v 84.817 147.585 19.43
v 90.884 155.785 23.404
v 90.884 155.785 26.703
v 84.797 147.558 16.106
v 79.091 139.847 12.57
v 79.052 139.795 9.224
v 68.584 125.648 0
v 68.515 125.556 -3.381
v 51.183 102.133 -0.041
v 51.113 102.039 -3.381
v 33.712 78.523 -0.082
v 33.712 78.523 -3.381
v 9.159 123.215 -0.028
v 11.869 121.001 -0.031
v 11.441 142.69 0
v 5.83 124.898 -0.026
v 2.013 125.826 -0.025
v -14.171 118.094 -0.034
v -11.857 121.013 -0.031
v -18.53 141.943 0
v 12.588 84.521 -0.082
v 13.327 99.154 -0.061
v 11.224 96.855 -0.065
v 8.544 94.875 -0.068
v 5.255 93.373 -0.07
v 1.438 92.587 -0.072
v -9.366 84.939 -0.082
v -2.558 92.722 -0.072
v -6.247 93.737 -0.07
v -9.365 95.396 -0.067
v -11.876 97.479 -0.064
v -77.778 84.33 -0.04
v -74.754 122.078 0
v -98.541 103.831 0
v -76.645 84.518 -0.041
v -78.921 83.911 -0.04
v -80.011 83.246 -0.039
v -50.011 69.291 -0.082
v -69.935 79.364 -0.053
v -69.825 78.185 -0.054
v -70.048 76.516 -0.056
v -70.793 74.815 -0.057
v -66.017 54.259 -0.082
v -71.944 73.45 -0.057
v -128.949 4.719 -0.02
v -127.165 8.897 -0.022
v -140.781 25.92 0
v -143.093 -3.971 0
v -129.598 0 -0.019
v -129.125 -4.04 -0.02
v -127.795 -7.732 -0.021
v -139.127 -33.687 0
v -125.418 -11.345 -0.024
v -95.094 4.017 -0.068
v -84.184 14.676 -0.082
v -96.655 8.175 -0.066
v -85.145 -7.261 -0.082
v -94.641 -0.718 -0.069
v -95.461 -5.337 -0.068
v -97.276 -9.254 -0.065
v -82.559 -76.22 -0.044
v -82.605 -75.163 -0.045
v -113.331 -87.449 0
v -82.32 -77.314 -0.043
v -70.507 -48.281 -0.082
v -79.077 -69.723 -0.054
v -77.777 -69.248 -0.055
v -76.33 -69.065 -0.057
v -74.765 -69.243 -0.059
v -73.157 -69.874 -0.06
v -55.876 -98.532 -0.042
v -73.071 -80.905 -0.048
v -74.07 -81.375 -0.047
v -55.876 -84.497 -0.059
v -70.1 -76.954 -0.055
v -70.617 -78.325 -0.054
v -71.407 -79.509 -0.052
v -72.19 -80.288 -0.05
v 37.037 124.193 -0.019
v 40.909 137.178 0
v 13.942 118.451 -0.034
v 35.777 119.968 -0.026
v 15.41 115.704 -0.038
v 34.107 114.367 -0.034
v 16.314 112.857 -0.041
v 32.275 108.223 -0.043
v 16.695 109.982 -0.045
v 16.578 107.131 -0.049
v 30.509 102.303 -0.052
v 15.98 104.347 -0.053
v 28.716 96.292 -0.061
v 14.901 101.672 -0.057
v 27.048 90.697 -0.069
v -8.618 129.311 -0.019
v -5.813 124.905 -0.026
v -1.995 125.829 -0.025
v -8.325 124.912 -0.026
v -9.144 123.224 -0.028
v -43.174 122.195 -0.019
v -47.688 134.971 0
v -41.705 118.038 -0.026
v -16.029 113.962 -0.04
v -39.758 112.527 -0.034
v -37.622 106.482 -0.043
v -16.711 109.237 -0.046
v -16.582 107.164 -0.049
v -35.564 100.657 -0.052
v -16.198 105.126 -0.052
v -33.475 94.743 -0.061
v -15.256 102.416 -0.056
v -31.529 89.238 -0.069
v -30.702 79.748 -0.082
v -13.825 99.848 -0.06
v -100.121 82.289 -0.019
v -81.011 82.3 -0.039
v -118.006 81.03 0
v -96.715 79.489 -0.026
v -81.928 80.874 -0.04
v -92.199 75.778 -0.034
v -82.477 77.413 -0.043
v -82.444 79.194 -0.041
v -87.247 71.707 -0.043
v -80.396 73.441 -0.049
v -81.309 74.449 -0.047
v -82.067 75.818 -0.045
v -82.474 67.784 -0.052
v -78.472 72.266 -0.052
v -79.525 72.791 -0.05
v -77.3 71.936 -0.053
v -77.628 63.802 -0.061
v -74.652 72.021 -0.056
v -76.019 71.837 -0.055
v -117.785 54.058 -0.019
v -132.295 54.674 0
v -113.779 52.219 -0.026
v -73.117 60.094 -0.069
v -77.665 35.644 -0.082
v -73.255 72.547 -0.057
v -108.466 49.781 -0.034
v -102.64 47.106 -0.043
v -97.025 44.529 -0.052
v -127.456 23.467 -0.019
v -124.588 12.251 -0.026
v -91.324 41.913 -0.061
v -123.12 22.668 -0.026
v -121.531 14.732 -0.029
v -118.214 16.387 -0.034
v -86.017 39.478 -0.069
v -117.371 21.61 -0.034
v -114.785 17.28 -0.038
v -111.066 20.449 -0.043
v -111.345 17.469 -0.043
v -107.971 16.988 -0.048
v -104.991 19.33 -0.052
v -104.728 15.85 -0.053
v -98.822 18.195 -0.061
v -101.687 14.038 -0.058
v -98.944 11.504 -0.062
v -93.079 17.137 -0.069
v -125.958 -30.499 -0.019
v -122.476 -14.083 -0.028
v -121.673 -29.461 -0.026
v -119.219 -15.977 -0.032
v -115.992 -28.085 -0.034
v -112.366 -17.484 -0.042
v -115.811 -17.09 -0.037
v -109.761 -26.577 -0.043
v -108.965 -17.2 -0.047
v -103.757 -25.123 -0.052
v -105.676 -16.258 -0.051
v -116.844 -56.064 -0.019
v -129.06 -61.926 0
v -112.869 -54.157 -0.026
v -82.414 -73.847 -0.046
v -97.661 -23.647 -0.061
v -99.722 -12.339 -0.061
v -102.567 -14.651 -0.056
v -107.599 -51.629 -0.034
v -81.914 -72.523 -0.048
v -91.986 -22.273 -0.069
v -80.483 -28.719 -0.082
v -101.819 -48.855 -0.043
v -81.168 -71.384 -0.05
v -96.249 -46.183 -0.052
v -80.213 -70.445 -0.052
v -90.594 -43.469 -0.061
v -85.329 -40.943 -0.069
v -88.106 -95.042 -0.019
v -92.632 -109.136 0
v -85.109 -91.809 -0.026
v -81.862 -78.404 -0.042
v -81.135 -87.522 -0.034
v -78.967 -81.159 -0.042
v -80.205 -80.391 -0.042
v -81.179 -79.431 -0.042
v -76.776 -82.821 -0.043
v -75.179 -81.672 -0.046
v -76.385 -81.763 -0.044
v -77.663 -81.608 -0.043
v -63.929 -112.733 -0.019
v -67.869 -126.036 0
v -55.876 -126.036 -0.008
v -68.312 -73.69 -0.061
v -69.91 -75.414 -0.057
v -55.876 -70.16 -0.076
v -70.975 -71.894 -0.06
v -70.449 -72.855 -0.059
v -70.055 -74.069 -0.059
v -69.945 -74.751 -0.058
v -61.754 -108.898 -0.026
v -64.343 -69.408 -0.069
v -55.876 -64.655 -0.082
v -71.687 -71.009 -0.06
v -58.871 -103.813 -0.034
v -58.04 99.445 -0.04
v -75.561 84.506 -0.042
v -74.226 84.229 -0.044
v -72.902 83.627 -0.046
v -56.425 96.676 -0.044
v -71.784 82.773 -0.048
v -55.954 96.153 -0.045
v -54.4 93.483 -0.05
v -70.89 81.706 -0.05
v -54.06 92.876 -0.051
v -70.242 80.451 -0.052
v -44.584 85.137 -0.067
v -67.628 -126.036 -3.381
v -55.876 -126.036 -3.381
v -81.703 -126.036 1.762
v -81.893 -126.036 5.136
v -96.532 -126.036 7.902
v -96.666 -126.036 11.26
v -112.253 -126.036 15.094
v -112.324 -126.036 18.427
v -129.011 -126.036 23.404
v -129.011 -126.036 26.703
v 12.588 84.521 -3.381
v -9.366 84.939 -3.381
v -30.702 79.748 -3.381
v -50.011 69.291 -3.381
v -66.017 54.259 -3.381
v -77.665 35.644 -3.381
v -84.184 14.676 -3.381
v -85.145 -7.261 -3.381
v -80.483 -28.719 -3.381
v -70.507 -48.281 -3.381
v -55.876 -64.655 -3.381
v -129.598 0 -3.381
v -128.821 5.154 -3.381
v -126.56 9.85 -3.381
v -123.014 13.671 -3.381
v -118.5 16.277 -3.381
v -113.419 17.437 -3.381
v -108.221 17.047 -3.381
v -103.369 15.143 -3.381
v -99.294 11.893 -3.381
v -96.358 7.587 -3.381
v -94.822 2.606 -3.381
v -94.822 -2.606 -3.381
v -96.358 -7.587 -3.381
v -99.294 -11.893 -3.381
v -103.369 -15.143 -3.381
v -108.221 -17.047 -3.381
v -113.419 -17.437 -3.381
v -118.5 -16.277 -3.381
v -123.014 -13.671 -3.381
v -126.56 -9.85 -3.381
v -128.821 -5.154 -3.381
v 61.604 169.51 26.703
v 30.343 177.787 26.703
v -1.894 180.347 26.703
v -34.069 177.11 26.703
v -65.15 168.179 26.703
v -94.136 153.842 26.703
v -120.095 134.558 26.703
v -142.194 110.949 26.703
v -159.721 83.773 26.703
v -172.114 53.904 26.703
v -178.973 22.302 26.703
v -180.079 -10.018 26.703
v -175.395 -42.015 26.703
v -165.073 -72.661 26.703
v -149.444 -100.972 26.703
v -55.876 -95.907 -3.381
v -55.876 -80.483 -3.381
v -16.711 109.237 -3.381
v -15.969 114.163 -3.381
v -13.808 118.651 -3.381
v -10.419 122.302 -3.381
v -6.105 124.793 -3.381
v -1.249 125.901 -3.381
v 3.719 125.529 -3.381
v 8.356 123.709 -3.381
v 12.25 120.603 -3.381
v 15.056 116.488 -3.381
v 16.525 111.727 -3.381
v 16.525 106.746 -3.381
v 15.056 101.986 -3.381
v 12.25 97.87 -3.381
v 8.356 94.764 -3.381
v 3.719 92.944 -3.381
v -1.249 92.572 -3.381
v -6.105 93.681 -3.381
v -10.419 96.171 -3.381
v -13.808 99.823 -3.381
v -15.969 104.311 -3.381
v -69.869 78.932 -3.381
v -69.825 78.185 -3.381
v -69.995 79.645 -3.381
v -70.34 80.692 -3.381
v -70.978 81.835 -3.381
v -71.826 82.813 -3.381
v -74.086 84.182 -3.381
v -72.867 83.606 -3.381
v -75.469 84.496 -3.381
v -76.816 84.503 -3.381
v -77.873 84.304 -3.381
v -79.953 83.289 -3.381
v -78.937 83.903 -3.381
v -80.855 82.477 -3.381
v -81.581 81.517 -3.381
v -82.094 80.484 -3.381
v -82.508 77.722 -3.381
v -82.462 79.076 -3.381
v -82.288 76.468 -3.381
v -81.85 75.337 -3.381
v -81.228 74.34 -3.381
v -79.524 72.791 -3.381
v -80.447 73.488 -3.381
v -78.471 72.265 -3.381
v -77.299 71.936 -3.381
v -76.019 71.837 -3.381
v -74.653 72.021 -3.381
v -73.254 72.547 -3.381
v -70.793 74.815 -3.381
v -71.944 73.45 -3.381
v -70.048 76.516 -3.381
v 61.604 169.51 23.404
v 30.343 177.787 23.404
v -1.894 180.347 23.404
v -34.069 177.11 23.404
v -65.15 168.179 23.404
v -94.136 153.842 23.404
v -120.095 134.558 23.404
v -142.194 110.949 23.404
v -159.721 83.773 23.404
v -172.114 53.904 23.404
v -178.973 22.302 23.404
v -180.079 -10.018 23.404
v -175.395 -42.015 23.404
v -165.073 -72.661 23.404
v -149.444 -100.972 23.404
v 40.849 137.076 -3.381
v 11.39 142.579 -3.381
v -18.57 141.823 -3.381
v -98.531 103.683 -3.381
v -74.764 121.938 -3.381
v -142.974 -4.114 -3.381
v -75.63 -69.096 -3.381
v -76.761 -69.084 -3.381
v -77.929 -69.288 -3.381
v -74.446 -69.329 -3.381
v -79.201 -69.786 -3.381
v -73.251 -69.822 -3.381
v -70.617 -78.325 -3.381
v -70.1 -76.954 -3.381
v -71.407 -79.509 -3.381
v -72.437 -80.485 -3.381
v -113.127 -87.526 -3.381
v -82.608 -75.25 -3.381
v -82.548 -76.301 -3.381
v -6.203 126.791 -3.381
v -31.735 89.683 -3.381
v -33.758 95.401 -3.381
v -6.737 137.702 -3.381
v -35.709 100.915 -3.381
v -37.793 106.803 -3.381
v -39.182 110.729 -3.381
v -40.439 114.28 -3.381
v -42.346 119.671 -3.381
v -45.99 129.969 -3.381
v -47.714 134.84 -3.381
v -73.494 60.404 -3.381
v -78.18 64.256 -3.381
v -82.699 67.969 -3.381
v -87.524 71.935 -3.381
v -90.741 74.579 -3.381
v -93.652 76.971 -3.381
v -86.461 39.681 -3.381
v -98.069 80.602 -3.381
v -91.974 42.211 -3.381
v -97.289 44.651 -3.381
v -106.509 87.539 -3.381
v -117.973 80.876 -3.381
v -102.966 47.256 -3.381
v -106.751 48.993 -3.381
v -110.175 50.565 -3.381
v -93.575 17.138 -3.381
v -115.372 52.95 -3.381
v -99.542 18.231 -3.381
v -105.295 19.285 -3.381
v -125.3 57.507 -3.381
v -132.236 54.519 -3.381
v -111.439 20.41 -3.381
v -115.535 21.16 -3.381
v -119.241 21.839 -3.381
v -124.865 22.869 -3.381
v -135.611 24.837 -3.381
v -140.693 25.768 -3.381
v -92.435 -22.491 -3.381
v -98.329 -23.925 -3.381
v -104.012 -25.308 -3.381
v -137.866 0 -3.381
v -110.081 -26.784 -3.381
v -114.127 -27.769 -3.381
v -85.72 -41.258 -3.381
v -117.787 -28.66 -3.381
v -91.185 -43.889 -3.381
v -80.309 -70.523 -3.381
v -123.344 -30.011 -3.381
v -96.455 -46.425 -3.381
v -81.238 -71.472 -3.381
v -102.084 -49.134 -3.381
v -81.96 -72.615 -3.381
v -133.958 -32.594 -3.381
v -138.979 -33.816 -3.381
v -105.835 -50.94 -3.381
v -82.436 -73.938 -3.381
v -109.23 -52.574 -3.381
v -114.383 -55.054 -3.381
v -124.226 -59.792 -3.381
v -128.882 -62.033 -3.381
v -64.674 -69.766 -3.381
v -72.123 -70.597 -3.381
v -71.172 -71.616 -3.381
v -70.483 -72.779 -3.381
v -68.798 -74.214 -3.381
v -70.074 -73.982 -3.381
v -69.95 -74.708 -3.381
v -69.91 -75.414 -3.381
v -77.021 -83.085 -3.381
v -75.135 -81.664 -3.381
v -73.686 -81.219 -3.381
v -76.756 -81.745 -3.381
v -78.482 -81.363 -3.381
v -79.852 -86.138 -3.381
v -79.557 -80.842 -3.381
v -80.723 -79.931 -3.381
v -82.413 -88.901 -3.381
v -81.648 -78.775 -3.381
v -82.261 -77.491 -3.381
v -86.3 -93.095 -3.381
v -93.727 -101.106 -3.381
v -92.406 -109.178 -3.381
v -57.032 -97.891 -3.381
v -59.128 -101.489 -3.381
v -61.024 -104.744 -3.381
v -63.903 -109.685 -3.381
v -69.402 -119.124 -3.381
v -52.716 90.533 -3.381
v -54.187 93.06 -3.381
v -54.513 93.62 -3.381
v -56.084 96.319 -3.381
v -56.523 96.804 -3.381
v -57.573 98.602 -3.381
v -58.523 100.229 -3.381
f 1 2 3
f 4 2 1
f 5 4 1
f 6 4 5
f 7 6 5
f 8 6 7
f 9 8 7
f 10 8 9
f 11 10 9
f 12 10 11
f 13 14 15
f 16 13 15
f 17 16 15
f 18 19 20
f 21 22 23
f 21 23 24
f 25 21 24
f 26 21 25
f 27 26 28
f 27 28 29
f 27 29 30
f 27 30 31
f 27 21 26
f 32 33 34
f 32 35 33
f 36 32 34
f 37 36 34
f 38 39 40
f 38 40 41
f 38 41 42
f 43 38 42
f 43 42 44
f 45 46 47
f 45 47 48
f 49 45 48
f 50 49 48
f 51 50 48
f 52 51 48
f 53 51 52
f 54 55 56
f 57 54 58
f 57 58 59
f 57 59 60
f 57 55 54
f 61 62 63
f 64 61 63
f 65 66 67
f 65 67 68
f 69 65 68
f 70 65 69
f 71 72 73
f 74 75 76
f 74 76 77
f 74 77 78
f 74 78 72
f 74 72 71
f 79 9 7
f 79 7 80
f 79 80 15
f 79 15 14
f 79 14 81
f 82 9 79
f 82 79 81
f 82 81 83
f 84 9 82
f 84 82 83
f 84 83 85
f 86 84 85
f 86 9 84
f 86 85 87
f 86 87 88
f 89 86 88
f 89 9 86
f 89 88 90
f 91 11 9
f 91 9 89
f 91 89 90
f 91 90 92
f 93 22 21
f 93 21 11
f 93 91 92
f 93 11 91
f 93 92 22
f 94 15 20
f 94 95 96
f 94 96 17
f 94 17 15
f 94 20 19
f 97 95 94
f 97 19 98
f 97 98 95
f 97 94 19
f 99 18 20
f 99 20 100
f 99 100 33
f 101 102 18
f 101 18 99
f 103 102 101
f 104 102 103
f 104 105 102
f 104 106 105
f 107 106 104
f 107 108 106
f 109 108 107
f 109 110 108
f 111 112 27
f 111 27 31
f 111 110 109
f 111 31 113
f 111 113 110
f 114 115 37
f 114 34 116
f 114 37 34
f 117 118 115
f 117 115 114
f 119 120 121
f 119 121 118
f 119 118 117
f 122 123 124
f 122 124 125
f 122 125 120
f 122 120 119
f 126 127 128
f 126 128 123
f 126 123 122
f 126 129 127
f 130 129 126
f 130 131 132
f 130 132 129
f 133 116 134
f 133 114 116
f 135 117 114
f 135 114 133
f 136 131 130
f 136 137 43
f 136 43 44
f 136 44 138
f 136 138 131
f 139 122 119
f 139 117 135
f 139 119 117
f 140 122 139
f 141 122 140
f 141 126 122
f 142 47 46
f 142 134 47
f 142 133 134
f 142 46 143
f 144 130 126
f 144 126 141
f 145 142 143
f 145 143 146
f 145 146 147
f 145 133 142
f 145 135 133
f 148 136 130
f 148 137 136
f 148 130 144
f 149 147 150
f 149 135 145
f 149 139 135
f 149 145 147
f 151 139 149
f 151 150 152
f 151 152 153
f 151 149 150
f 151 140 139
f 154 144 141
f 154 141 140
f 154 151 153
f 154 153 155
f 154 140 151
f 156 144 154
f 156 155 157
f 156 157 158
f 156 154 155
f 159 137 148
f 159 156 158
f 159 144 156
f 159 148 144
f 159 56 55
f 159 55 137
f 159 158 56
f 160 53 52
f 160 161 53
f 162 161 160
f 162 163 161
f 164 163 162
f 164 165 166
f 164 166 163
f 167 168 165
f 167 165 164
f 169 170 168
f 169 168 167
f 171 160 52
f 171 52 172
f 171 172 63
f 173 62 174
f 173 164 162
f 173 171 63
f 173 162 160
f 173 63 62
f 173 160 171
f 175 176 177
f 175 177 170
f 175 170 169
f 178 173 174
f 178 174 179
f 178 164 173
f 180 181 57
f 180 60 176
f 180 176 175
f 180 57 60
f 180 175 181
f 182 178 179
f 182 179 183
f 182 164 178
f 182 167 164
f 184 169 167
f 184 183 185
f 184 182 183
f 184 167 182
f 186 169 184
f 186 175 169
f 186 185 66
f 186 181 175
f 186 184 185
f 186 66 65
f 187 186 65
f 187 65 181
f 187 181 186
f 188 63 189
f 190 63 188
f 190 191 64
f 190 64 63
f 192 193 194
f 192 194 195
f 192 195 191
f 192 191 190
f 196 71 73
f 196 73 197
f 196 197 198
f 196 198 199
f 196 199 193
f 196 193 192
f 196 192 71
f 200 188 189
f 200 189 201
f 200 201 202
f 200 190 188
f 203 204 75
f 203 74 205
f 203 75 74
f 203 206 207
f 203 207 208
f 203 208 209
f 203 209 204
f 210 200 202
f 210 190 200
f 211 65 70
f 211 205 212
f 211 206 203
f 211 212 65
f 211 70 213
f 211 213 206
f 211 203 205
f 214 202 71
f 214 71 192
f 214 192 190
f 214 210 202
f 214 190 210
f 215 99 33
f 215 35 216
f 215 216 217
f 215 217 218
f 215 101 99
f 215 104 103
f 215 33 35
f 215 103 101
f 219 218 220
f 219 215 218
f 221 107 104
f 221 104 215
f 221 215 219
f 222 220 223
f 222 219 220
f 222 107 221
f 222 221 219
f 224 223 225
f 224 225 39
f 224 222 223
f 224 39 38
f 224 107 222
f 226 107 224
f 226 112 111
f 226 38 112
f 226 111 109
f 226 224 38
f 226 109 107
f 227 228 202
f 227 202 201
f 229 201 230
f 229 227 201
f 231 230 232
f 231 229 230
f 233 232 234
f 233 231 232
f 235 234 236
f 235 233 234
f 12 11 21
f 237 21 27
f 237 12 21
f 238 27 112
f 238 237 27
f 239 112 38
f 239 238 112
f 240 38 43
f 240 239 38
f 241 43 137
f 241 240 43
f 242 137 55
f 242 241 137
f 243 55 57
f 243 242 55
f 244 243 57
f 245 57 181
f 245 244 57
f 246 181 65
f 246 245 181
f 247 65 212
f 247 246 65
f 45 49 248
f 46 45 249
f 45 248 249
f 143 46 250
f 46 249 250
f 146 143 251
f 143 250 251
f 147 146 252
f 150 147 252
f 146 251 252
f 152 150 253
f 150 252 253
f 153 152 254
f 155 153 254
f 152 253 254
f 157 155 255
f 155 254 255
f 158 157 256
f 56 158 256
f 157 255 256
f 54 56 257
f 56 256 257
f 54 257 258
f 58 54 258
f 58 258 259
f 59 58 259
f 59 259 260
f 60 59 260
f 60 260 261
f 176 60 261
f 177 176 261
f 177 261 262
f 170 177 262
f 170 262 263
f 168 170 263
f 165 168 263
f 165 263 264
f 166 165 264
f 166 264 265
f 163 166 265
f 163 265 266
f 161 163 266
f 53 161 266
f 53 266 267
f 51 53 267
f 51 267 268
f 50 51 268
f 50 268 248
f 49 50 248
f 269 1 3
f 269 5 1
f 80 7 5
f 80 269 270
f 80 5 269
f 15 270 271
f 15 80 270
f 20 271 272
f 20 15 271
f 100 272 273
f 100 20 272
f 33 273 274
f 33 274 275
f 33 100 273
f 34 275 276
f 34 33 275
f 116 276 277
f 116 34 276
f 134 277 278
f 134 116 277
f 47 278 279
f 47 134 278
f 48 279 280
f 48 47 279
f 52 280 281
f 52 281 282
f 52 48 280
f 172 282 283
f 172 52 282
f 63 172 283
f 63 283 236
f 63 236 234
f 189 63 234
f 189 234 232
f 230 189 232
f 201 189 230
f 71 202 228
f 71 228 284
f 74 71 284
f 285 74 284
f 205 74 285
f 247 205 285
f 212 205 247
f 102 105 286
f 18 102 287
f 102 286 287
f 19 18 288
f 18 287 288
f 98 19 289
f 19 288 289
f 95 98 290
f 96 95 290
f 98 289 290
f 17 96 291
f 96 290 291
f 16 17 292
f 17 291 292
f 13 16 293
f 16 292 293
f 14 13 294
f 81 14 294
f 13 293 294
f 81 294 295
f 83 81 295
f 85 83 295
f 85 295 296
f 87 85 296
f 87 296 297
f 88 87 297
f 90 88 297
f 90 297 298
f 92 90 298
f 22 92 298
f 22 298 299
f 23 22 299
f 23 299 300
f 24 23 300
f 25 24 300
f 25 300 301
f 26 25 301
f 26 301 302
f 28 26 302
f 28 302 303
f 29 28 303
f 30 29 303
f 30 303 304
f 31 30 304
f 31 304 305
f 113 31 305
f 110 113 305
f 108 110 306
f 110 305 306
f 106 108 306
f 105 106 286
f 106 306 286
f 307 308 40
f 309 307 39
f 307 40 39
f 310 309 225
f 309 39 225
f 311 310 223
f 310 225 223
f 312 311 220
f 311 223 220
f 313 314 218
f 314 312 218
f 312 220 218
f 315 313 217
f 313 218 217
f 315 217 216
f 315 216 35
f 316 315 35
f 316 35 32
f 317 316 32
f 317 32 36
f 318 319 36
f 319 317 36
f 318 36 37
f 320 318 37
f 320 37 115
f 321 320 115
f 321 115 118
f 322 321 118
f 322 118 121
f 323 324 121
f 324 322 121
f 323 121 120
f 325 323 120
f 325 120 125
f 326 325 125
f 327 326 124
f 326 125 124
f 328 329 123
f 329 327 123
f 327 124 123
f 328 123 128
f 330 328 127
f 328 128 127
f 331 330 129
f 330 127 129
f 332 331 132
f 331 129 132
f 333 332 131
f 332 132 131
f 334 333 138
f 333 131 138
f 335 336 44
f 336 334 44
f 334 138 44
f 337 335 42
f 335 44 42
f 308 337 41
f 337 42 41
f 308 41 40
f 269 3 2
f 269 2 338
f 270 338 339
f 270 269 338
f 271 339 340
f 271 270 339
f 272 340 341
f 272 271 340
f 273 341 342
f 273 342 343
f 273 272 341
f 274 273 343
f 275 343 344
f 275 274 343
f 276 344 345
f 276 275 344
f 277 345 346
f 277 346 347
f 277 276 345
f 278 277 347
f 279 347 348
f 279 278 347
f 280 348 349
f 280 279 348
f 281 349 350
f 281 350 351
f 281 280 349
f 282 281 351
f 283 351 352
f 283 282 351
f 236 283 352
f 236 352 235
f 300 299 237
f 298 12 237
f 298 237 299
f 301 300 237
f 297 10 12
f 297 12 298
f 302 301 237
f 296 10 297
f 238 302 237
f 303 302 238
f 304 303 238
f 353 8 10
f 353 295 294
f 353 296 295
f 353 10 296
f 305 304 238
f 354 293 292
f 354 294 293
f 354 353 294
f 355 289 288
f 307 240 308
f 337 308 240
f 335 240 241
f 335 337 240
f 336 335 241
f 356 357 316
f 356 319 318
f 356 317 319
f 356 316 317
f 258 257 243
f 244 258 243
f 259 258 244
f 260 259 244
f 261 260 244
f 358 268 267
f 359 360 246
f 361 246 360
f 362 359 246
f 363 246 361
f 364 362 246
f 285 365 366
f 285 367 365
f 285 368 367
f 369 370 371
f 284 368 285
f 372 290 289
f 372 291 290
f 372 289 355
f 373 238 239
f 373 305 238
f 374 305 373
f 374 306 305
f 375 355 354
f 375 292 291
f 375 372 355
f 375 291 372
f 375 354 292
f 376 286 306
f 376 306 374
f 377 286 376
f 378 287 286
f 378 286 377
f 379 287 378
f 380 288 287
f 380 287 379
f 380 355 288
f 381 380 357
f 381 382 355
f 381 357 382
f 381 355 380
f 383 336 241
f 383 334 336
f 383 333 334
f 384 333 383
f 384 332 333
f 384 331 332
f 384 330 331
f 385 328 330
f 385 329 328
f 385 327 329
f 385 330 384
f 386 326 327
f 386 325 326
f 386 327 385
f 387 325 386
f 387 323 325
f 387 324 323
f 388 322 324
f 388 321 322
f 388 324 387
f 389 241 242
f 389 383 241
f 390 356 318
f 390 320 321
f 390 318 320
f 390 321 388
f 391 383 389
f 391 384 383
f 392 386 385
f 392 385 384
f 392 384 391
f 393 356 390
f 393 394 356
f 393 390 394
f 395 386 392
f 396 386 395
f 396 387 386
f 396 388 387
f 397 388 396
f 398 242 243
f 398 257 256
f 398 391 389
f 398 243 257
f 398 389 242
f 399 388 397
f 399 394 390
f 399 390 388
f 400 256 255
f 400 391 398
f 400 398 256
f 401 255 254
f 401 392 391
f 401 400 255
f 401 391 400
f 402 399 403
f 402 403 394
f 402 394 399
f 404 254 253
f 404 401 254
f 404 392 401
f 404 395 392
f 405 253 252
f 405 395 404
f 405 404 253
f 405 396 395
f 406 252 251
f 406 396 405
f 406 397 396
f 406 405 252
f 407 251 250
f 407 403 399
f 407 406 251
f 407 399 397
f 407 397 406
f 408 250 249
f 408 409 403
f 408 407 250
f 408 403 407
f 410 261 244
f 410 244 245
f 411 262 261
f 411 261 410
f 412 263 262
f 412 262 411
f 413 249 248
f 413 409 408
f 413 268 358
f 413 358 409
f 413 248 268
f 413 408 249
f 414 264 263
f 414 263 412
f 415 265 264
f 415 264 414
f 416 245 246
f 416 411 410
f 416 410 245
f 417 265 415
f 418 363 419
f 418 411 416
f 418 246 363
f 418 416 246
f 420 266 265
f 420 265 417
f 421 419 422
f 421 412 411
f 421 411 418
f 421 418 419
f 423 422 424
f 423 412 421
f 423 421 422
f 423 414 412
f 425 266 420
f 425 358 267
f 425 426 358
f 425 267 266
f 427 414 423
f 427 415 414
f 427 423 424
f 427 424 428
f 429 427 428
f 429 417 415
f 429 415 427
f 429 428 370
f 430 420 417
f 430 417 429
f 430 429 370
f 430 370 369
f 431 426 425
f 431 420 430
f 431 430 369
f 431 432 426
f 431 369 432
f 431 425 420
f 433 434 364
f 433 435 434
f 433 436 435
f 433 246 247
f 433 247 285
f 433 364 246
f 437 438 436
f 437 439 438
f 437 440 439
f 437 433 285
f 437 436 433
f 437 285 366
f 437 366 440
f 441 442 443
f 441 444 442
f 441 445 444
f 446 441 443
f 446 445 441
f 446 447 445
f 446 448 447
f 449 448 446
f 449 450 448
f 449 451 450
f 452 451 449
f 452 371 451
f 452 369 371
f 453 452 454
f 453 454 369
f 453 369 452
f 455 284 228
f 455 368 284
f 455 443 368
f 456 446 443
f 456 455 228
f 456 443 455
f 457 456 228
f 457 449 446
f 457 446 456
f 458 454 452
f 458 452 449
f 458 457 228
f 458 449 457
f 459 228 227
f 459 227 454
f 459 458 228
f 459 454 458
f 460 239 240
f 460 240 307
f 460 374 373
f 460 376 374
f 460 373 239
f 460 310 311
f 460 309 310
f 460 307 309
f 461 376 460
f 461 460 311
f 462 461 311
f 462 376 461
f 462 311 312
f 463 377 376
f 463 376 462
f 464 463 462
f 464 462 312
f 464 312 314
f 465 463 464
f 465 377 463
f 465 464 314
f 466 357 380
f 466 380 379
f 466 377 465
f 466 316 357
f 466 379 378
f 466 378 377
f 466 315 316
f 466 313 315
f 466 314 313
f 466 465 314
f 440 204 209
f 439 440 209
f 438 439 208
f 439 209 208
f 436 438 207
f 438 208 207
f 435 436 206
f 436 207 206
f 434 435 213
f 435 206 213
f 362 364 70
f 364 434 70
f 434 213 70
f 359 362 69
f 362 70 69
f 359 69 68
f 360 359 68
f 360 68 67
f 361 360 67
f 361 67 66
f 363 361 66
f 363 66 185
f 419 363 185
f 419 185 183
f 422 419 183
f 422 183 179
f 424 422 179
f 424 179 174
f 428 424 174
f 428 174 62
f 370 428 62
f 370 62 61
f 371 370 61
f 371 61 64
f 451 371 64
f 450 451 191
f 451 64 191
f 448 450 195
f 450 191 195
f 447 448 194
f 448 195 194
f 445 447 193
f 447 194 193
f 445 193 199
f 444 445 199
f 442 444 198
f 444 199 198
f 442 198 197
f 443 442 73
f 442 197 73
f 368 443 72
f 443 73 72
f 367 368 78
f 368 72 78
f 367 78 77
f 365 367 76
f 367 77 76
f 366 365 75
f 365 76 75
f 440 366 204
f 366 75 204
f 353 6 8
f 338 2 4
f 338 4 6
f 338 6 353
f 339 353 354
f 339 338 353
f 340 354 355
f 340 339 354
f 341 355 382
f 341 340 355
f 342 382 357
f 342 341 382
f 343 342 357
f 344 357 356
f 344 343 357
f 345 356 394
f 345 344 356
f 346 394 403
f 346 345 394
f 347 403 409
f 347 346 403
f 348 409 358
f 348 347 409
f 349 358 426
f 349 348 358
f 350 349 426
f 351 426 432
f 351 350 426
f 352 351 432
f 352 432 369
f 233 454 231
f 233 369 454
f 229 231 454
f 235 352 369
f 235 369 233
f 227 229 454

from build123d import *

# Parameters (mm, degrees)
CUT_EXTRUDE1_DEPTH      = 257.457873087
CUT_EXTRUDE1_DEPTH_BACK = 257.457873087
SKETCH5_R               = 6.35
CUT_EXTRUDE4_DEPTH      = 257.457873098
SKETCH6_R               = 16.711436386
SKETCH6_R_2             = 17.485757022
CUT_EXTRUDE5_DEPTH      = 257.83197321
SKETCH7_W               = 38.686396819
SKETCH7_H               = 81.826205817
CUT_EXTRUDE6_DEPTH      = 257.457873098
CUT_EXTRUDE7_DEPTH      = 257.457873098
CUT_EXTRUDE7_DEPTH_BACK = 257.457873098
CUT_EXTRUDE8_START      = -3.381369738
CUT_EXTRUDE8_DEPTH      = 30.084768361


# Read off the part's stored shape, not the designer's step: Cut-Extrude8
with BuildPart() as part:
    # Sweep2: sweep along a path in Sketch1
    with BuildLine(Plane.XY) as sweep2_path:
        CenterArc((0, 0), 139.7, 0, 360)
    # Sketch2 → Sweep2 (sweep)
    with BuildSketch(Plane(origin=(0, 0, 0), x_dir=(0, 0, -1), z_dir=(1, 0, 0))):
        Polygon((0.081951645, 85.453687679), (0, 143.147726507), (-26.703398523, 180.357380187), (-23.40398043, 180.357380187), (3.381369738, 143.033531592), (3.381369738, 85.453687679), align=None)
    sweep(path=sweep2_path.line)

    # Sketch3 → Cut-Extrude1 (cut, two sides: drawn at the far end of the back side and taken through both)
    with BuildSketch(Plane.XY.offset(-CUT_EXTRUDE1_DEPTH_BACK)):
        Polygon((821.723604832, 900.839301856), (152.923564845, 137.799256234), (60.497234444, 32.34921564), (-41.171728997, -70.159987168), (-55.875917924, -70.159987168), (-55.875917924, -126.035905092), (-167.627753772, -126.035905092), (-167.627753772, -181.911823016), (-167.627753772, -1196.566249267), (1667.740204928, -2062.313830848), (2657.091563532, 35.091720274), align=None)
    extrude(amount=CUT_EXTRUDE1_DEPTH + CUT_EXTRUDE1_DEPTH_BACK, mode=Mode.SUBTRACT)

    # Sketch5 → Cut-Extrude4 (cut, through all)
    with BuildSketch(Plane.XY):
        with Locations((-76.174636448, 78.185490602)):
            Circle(SKETCH5_R)
        with Locations((-76.260331952, -75.414325116)):
            Circle(SKETCH5_R)
    extrude(amount=-CUT_EXTRUDE4_DEPTH, mode=Mode.SUBTRACT)

    # Sketch6 → Cut-Extrude5 (cut, through all)
    with BuildSketch(Plane(origin=(0, 0, -3.381369738), x_dir=(-1, 0, 0), z_dir=(0, 0, -1))):
        with Locations((0, 109.236739893)):
            Circle(SKETCH6_R)
        with Locations((112.112202079, 0)):
            Circle(SKETCH6_R_2)
    extrude(amount=-CUT_EXTRUDE5_DEPTH, mode=Mode.SUBTRACT)

    # Sketch7 → Cut-Extrude6 (cut, through all)
    with BuildSketch(Plane.XY):
        with Locations((-36.532719515, -85.122802183)):
            Rectangle(SKETCH7_W, SKETCH7_H)
    extrude(amount=-CUT_EXTRUDE6_DEPTH, mode=Mode.SUBTRACT)

    # Sketch8 → Cut-Extrude7 (cut, two sides: drawn at the far end of the back side and taken through both)
    with BuildSketch(Plane.XY.offset(-CUT_EXTRUDE7_DEPTH_BACK)):
        with BuildLine():
            Line((517.613905497, -613.797286977), (111.177648296, 90.170960534))
            Line((111.177648296, 90.170960534), (95.308152083, 117.657734266))
            ThreePointArc((95.308152083, 117.657734266), (92.009440132, 125.621529396), (90.884310916, 134.167734266))
            Line((90.884310916, 134.167734266), (90.884310916, 169.901611192))
            Line((90.884310916, 169.901611192), (90.884310916, 982.774125595))
            Line((90.884310916, 982.774125595), (1661.496369245, 1402.565336698))
            Line((1661.496369245, 1402.565336698), (2088.225963826, -194.006075874))
            Line((2088.225963826, -194.006075874), (517.613905497, -613.797286977))
        make_face()
    extrude(amount=CUT_EXTRUDE7_DEPTH + CUT_EXTRUDE7_DEPTH_BACK, mode=Mode.SUBTRACT)

    # Cut-Extrude8 outline → Cut-Extrude8 (cut)
    with BuildSketch(Plane.XY.offset(CUT_EXTRUDE8_START)):
        with BuildLine():
            Line((90.884310916, 155.784551921), (33.711604752, 78.522993084))
            ThreePointArc((33.711604752, 78.522993084), (55.441528266, 65.02745329), (72.203661887, 45.705185132))
            Line((72.203661887, 45.705185132), (111.177648296, 90.170960534))
            Line((111.177648296, 90.170960534), (95.308152083, 117.657734266))
            ThreePointArc((95.308152083, 117.657734266), (92.009440132, 125.621529397), (90.884310916, 134.167734266))
            Line((90.884310916, 134.167734266), (90.884310916, 155.784551921))
        make_face()
    extrude(amount=CUT_EXTRUDE8_DEPTH, mode=Mode.SUBTRACT)


solid = part.part
